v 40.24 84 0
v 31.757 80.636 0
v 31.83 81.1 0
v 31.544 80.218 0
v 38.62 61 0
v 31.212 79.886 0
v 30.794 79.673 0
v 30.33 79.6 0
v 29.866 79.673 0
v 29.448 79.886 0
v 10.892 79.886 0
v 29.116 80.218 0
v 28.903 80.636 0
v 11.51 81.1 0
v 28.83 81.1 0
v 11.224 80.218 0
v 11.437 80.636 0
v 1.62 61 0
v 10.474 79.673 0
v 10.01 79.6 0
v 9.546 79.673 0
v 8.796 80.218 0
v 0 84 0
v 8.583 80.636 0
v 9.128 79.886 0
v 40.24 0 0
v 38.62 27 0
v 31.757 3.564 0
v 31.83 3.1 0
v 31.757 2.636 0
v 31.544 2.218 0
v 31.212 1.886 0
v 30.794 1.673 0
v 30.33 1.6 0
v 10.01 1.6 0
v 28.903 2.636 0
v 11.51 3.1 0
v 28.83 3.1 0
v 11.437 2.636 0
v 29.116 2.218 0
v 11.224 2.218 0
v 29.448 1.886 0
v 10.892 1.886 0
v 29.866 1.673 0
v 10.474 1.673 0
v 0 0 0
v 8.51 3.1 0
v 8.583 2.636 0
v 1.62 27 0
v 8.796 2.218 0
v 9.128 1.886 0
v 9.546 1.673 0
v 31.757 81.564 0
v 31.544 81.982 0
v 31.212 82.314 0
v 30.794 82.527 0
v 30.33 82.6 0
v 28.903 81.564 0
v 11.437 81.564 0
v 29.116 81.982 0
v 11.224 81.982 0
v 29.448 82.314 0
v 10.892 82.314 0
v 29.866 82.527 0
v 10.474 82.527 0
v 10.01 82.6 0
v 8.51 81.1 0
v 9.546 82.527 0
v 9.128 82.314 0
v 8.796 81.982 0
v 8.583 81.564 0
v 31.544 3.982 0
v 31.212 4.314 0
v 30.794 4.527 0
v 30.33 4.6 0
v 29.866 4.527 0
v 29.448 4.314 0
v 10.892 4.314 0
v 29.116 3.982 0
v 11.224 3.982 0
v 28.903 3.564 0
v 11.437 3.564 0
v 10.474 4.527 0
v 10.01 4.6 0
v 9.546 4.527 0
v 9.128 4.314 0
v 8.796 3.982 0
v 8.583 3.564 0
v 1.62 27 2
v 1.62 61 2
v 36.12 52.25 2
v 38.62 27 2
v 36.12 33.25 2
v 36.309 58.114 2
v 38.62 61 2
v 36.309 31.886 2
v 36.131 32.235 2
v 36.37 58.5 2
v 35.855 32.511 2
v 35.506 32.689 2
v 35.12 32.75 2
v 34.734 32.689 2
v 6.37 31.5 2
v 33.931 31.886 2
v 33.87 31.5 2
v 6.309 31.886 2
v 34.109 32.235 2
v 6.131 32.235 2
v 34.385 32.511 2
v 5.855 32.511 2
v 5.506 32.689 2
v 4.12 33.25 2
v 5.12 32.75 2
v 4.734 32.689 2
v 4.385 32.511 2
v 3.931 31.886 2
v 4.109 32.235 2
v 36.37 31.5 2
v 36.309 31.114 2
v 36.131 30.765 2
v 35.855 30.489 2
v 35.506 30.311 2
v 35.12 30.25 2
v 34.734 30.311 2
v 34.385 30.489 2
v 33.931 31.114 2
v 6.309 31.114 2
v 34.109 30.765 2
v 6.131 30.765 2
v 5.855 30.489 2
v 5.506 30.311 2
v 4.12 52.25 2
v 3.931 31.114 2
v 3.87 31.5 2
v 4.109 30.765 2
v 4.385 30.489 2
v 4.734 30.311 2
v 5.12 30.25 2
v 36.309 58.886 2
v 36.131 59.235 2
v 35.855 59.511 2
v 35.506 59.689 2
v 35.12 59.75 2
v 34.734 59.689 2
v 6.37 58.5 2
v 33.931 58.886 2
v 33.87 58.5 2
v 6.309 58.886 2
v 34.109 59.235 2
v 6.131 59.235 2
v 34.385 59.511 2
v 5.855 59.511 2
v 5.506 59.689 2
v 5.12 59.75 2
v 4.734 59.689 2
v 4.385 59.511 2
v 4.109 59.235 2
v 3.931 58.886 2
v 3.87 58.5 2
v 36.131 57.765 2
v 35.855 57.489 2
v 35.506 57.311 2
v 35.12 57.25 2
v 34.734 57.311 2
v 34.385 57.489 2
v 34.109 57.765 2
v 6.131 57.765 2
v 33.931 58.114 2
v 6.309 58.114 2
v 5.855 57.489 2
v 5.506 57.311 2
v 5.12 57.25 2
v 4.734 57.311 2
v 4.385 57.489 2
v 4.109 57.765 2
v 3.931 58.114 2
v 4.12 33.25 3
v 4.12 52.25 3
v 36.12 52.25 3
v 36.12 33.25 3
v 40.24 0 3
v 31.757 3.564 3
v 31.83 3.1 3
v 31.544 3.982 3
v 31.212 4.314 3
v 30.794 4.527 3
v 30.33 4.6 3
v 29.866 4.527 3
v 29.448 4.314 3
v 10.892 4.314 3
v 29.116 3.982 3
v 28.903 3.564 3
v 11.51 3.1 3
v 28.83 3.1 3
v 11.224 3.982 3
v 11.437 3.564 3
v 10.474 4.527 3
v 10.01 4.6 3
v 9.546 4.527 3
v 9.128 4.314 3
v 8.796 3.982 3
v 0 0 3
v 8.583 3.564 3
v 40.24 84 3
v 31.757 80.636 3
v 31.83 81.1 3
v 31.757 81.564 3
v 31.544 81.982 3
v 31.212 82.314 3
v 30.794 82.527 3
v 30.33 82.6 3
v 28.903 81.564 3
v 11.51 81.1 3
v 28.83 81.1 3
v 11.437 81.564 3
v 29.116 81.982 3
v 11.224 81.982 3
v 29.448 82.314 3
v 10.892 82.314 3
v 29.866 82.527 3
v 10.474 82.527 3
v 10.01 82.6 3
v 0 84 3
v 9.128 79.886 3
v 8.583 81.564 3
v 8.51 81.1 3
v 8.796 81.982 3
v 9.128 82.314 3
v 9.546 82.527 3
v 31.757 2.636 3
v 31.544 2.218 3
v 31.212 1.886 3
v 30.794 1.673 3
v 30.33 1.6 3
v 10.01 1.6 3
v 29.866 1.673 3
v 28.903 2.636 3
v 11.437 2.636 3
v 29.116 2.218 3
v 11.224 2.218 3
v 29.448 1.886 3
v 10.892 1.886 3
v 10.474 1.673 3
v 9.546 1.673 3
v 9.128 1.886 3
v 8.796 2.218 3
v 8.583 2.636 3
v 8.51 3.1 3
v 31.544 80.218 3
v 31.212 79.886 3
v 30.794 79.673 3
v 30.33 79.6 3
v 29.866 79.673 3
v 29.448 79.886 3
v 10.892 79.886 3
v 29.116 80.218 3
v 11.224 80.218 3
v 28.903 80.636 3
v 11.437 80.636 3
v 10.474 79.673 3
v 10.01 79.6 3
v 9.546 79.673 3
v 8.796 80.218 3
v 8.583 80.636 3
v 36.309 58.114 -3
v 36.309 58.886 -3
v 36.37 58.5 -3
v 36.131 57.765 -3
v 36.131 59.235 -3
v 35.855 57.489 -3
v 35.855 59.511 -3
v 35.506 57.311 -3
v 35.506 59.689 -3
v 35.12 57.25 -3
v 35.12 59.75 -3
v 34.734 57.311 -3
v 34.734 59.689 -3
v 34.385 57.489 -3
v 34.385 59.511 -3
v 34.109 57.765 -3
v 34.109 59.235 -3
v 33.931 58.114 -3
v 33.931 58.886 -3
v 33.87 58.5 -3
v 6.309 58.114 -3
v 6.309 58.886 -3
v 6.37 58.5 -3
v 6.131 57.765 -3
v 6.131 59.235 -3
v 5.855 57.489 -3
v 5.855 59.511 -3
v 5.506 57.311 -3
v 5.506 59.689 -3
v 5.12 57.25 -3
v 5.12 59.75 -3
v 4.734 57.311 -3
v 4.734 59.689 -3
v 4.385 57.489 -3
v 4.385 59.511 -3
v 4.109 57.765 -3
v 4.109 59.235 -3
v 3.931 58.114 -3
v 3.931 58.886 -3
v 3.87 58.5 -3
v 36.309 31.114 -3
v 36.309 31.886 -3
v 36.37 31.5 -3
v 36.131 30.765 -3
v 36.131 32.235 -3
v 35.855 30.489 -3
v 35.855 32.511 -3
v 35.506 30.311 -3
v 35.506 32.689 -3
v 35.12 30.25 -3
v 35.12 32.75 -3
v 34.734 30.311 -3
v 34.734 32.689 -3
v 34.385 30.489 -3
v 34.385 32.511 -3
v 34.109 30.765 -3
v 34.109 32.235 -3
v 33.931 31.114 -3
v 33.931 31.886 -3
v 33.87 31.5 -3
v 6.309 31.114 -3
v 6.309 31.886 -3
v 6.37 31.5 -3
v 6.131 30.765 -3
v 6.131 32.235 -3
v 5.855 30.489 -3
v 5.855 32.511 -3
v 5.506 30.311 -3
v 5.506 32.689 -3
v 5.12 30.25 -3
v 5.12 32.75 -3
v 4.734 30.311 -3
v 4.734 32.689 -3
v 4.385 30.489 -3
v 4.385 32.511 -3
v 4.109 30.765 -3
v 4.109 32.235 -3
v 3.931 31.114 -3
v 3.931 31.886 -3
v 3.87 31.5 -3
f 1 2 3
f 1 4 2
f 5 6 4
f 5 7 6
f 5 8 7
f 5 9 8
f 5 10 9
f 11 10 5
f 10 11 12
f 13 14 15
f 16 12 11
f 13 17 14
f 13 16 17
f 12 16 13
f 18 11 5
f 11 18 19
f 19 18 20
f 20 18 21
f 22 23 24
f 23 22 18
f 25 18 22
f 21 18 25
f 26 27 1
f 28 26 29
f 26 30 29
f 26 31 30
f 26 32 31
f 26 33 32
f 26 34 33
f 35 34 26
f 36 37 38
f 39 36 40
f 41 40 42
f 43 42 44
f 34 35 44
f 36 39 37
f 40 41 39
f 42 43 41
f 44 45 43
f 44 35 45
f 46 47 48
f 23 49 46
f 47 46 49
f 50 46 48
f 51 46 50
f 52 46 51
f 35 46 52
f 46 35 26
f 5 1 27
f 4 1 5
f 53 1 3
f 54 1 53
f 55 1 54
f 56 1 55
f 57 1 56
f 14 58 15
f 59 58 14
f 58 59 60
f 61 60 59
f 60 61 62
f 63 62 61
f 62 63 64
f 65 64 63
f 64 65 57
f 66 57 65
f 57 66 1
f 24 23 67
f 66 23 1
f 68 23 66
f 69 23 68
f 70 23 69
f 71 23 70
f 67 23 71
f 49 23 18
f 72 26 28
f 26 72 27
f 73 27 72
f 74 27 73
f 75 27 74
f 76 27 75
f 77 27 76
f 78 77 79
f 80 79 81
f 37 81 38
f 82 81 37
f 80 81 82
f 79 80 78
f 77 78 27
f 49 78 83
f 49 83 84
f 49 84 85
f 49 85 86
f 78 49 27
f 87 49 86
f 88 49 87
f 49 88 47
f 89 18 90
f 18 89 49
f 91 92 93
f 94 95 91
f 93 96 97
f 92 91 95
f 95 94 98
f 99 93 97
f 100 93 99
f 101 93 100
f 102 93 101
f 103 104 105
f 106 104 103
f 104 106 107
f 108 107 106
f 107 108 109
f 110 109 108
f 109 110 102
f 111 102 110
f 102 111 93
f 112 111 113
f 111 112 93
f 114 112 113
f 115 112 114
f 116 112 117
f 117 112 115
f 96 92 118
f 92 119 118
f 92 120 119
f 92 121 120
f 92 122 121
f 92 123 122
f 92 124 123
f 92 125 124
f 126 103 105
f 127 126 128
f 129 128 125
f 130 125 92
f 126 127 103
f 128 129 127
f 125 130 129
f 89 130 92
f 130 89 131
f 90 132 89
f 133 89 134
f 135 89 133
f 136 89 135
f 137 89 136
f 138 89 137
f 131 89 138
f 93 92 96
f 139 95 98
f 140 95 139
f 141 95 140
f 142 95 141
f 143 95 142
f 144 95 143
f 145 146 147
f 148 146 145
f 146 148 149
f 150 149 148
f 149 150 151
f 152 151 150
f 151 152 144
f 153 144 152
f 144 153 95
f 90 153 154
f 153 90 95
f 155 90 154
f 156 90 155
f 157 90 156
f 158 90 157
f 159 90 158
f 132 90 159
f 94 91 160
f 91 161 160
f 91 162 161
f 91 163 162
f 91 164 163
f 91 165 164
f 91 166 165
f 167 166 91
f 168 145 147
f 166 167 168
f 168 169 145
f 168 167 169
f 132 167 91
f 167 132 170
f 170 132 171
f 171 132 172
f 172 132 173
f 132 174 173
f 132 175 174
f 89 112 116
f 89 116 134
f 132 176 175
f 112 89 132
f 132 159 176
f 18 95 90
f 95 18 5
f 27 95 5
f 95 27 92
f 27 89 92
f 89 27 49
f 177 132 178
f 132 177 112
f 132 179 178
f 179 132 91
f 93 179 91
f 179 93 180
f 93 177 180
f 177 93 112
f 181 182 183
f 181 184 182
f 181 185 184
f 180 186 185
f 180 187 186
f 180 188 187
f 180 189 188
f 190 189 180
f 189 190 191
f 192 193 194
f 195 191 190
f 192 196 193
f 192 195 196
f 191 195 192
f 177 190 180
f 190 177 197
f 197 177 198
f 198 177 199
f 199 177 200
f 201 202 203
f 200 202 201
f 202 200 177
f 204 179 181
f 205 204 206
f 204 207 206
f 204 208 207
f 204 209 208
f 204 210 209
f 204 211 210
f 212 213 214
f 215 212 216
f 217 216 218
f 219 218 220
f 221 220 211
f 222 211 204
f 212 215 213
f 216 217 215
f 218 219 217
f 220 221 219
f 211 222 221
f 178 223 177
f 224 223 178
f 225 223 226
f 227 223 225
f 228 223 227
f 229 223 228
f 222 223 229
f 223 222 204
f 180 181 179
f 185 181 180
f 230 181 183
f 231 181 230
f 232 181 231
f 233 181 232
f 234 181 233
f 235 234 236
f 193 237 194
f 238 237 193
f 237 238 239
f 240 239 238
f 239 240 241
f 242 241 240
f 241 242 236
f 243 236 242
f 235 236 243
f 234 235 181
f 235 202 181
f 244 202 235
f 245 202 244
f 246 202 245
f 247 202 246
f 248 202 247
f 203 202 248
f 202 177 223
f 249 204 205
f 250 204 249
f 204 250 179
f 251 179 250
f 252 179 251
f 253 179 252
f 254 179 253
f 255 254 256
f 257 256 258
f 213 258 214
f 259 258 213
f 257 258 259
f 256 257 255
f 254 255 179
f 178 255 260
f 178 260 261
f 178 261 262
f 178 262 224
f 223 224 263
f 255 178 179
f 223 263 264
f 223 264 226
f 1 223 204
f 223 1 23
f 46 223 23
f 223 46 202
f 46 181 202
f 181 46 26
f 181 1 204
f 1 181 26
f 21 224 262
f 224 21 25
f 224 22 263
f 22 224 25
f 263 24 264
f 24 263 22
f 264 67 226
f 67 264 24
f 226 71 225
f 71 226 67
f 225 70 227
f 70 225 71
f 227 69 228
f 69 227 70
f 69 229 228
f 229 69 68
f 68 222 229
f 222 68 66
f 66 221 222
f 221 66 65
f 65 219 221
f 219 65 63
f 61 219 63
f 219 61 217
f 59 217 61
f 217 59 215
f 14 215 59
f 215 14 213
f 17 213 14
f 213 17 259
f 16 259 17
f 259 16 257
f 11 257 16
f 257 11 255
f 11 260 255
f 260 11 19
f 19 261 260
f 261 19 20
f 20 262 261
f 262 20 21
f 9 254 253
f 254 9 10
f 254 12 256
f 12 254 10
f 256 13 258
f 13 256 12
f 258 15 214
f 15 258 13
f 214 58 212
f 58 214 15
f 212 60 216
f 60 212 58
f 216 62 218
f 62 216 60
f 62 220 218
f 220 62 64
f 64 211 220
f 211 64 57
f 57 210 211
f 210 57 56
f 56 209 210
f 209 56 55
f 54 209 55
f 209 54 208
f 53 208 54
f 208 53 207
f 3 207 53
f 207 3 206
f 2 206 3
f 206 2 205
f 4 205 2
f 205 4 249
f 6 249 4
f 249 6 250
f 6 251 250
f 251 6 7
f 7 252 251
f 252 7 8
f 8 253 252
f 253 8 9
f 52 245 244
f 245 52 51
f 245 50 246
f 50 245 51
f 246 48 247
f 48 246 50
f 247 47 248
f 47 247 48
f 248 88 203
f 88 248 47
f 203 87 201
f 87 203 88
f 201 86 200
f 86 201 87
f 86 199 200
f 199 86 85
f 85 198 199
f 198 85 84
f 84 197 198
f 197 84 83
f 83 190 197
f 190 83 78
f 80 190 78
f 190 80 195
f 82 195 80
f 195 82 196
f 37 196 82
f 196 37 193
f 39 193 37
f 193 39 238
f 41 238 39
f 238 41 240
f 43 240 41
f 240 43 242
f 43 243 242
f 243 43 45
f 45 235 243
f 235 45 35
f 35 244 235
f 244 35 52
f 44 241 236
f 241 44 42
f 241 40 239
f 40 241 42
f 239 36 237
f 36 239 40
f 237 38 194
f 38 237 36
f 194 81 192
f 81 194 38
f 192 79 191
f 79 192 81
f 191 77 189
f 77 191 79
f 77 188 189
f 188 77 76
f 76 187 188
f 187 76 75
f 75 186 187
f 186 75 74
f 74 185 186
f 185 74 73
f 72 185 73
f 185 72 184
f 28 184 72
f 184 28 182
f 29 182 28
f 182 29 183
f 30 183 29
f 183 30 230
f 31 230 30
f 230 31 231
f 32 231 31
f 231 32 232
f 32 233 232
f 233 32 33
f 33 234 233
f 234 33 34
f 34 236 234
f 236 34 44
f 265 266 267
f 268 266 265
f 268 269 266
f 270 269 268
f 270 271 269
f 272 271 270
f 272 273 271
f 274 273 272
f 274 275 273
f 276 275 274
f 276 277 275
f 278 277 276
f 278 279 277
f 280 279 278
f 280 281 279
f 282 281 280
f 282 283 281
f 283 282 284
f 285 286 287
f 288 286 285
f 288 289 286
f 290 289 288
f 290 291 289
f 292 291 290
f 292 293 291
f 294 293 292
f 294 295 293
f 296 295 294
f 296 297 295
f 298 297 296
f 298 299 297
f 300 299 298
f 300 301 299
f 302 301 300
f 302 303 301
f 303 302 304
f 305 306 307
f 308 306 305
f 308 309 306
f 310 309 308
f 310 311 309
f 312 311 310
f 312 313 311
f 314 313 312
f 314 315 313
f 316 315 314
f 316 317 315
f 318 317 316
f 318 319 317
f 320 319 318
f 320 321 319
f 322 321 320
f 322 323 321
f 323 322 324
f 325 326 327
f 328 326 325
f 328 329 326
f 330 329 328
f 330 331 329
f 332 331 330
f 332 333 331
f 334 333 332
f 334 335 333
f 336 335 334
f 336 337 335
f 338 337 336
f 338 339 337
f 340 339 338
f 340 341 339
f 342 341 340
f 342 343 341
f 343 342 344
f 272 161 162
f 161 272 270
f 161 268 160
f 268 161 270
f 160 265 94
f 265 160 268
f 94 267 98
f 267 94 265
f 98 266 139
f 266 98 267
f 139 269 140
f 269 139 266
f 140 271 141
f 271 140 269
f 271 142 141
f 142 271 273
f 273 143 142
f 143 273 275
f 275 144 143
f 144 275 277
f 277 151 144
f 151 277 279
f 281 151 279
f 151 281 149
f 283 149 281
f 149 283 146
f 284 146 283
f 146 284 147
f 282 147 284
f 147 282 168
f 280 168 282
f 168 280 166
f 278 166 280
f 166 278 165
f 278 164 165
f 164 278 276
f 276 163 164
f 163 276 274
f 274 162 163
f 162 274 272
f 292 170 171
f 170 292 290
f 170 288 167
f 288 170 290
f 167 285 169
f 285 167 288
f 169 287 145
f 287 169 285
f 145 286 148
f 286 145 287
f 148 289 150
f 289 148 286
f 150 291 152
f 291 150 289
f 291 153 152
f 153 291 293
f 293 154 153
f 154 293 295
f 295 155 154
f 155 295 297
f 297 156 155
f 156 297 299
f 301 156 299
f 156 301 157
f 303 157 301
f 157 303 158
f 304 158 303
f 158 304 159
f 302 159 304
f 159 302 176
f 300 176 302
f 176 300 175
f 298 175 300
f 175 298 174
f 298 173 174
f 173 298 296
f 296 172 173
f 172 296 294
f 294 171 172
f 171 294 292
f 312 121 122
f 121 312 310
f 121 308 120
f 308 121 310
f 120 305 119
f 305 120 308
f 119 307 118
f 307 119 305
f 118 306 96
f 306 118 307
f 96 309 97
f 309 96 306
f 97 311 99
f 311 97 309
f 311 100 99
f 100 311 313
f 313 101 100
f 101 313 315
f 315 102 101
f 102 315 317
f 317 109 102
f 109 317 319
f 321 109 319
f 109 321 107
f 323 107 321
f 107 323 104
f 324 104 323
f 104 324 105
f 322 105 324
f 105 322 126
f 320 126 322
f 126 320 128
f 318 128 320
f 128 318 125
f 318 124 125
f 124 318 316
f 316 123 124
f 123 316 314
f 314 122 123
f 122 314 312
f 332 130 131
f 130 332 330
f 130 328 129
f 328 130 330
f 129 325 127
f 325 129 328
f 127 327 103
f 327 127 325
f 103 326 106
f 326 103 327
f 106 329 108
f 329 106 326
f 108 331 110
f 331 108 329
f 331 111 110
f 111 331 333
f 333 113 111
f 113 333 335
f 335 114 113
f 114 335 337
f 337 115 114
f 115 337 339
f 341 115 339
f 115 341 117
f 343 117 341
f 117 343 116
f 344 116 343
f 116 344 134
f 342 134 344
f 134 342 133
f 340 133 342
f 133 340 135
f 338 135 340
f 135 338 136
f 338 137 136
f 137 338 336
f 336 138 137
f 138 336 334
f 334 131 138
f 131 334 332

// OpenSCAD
// file: panel.scad
$fn = 20;
U = 3;
T = 16;

h = U * 44.5 - 5;
w = T * 5.08 - 2*.2;

m_x = 7.47;
//m_x = 0;
m_y = 3.1;
m_d = 3;

F = U * 44.5 + (122.5 - 3 * 44.5);

echo(w);

module hole() {
//    hull() {
    //circle(d=m_d);
    translate([5.08/2,0]) circle(d=m_d);
//    }
}

module holes() {
    translate([m_x, m_y]) hole();
    translate([m_x, m_y + F]) hole();
}

module panel() {
    difference() {
    square([w, h]);
        holes();
        if(T>6) {
            translate([(T-3) * 5.08 - 5.08, 0]) holes();
        }
        translate([(T-24) * 5.08, 0]) holes();
    }
}

//panel();

//#square([46,62]);
//#import("jr-module-bay-cover.stl");
// main file
b_w = 13;
b_h = 20;

include <panel.scad>

U=2;
T=8;

module oled_mount() {
    d=2.5;
    translate([0,0,-3])
    linear_extrude(6,true) {
        translate([15, 16.5]) circle(d=d);
        mirror([0,1]) translate([15, 10.5]) circle(d=d);
        mirror([1,1]) translate([10.5, 15]) circle(d=d);
        mirror([1,0]) translate([15, 16.5]) circle(d=d);
    }
}


module oled() {
    translate([0, 2])
    linear_extrude(2)
    square([37, 34], true);
    //linear_extrude(2)
    //square([32, 20], true);
    
    translate([0, 13.5/2-6])
    linear_extrude(10)
    square([32, 19], true);
}


difference() {
    linear_extrude(3)
    difference() {
    panel();
    }
    translate([w/2, h/2])
    oled();

}

translate([w/2,h/2])
oled_mount();
